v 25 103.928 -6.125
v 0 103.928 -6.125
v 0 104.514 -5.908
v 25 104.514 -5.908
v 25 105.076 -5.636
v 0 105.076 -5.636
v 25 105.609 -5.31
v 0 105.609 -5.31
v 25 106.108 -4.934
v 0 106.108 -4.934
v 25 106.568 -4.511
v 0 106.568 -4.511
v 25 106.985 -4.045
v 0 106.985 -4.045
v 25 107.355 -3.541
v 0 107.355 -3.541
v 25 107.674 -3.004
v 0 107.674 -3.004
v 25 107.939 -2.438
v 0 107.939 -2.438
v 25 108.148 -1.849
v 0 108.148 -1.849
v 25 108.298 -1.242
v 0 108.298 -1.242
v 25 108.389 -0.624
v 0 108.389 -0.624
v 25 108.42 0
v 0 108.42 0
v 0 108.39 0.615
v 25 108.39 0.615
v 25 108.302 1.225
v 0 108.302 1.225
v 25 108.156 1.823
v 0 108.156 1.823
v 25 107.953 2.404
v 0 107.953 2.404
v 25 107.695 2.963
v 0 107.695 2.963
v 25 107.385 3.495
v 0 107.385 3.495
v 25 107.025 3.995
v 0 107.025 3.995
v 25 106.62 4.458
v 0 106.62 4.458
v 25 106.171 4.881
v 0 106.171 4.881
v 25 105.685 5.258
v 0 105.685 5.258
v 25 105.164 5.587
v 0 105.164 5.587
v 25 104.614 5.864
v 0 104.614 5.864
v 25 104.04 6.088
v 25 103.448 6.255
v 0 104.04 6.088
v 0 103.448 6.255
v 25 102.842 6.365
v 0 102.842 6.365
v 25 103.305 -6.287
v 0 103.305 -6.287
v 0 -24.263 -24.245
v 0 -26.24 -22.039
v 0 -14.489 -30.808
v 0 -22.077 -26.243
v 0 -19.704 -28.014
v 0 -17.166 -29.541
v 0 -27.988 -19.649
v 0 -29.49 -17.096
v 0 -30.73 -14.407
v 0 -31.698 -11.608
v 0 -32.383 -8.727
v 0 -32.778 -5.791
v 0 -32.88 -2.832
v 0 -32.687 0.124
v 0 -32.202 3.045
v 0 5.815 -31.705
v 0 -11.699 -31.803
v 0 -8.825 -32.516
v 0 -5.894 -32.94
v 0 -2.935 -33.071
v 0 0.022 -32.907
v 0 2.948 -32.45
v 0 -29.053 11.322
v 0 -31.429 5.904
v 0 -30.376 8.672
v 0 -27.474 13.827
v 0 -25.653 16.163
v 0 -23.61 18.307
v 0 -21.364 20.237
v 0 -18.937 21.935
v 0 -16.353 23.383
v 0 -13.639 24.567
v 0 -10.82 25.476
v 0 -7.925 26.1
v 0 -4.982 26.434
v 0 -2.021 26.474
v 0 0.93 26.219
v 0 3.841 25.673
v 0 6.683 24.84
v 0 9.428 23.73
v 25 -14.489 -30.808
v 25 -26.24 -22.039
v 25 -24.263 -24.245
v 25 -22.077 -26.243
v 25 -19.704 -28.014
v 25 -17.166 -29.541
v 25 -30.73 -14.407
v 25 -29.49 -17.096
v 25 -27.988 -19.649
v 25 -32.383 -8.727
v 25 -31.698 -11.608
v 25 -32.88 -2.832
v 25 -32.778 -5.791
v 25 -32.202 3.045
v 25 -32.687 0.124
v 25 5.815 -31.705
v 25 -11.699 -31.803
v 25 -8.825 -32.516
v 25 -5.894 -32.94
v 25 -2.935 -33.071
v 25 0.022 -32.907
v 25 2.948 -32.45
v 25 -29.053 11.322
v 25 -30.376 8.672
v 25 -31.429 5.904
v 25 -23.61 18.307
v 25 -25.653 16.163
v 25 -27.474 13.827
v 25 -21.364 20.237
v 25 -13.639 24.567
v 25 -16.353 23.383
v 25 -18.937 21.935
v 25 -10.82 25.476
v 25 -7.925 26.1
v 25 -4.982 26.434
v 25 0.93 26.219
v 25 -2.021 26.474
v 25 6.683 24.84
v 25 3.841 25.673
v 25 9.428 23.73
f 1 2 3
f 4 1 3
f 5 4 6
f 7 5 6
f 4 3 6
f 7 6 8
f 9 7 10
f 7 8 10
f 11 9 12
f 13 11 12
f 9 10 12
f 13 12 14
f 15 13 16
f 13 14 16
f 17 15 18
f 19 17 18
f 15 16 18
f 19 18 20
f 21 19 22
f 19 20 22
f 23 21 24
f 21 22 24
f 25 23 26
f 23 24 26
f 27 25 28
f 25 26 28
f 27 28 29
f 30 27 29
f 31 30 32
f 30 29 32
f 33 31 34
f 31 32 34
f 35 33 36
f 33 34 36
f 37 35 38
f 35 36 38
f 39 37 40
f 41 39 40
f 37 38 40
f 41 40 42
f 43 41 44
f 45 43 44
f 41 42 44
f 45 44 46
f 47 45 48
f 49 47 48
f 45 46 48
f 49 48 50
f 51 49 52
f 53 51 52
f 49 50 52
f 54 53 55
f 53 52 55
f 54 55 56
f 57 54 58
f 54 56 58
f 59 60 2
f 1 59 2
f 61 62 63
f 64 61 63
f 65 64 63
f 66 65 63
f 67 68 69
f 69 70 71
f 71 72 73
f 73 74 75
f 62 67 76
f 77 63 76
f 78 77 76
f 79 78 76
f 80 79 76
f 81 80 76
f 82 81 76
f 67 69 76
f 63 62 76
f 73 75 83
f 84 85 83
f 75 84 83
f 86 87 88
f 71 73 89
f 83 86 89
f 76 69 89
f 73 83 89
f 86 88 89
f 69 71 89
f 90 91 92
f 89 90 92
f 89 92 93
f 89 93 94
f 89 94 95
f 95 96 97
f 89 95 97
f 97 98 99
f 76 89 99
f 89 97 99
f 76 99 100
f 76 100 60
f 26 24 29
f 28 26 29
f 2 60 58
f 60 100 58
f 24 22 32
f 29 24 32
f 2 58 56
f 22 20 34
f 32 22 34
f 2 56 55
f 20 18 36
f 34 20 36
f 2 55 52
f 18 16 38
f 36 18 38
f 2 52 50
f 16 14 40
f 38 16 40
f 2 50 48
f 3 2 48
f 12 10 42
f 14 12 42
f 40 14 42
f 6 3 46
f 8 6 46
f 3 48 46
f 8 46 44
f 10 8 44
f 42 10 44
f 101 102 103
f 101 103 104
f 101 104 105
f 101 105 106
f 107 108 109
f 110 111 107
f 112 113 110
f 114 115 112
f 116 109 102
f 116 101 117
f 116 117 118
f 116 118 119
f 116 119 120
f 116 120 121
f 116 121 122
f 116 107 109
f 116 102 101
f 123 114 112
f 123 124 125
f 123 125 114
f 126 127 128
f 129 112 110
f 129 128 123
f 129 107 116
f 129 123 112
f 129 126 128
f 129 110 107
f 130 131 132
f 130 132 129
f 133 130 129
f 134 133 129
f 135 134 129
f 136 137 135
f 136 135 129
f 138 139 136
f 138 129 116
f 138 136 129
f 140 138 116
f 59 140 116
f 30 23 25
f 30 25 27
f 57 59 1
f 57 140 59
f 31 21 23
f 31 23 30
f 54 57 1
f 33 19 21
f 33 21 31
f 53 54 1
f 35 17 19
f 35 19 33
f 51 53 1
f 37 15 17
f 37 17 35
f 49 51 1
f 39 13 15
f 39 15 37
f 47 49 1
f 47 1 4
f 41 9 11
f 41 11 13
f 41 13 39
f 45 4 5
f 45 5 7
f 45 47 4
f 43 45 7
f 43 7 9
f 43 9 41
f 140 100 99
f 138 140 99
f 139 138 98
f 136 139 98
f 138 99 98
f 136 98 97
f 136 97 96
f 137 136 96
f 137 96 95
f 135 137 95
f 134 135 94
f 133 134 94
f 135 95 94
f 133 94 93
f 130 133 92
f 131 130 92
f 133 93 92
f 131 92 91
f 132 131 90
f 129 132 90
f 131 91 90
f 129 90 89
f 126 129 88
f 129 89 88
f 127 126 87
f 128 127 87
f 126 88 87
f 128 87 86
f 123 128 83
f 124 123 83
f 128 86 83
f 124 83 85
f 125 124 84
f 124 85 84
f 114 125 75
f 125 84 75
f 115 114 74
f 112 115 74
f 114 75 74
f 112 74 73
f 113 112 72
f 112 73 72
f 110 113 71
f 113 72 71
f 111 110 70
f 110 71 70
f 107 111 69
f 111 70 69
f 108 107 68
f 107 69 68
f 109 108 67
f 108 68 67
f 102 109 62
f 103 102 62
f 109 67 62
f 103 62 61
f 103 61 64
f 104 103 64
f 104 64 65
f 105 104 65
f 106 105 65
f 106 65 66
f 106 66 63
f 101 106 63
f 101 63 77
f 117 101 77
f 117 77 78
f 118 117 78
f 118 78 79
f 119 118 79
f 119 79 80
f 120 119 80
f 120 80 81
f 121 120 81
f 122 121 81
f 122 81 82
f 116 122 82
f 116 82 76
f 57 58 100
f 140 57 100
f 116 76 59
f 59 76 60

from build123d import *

# Parameters (mm, degrees)
F1_DEPTH = 25


with BuildPart() as f1:
    # F0 (on Right) → F1 (new body)
    with BuildSketch(Plane.YZ):
        with BuildLine():
            ThreePointArc((5.81453, -31.705164), (20.904065, -20.916165), (26.680938, -3.288791))
            ThreePointArc((26.680938, -3.288791), (21.999843, 12.73976), (9.428084, 23.729661))
            ThreePointArc((9.428084, 23.729661), (-32.820494, -1.351527), (5.81453, -31.705164))
        make_face()
        with BuildLine():
            ThreePointArc((9.428084, 23.729661), (21.999843, 12.73976), (26.680938, -3.288791))
            ThreePointArc((26.680938, -3.288791), (20.904065, -20.916165), (5.81453, -31.705164))
            Line((5.81453, -31.705164), (103.305496, -6.28672))
            ThreePointArc((103.305496, -6.28672), (95.581705, -0.235054), (102.842035, 6.365493))
            Line((102.842035, 6.365493), (9.428084, 23.729661))
        make_face()
        with BuildLine():
            ThreePointArc((108.419674, 0), (106.827989, 4.231712), (102.842035, 6.365493))
            ThreePointArc((102.842035, 6.365493), (95.581705, -0.235054), (103.305496, -6.28672))
            Line((103.305496, -6.28672), (103.92752, -6.124542))
            ThreePointArc((103.92752, -6.124542), (107.176242, -3.797679), (108.419674, 0))
        make_face()
    extrude(amount=F1_DEPTH)


solid = f1.part
